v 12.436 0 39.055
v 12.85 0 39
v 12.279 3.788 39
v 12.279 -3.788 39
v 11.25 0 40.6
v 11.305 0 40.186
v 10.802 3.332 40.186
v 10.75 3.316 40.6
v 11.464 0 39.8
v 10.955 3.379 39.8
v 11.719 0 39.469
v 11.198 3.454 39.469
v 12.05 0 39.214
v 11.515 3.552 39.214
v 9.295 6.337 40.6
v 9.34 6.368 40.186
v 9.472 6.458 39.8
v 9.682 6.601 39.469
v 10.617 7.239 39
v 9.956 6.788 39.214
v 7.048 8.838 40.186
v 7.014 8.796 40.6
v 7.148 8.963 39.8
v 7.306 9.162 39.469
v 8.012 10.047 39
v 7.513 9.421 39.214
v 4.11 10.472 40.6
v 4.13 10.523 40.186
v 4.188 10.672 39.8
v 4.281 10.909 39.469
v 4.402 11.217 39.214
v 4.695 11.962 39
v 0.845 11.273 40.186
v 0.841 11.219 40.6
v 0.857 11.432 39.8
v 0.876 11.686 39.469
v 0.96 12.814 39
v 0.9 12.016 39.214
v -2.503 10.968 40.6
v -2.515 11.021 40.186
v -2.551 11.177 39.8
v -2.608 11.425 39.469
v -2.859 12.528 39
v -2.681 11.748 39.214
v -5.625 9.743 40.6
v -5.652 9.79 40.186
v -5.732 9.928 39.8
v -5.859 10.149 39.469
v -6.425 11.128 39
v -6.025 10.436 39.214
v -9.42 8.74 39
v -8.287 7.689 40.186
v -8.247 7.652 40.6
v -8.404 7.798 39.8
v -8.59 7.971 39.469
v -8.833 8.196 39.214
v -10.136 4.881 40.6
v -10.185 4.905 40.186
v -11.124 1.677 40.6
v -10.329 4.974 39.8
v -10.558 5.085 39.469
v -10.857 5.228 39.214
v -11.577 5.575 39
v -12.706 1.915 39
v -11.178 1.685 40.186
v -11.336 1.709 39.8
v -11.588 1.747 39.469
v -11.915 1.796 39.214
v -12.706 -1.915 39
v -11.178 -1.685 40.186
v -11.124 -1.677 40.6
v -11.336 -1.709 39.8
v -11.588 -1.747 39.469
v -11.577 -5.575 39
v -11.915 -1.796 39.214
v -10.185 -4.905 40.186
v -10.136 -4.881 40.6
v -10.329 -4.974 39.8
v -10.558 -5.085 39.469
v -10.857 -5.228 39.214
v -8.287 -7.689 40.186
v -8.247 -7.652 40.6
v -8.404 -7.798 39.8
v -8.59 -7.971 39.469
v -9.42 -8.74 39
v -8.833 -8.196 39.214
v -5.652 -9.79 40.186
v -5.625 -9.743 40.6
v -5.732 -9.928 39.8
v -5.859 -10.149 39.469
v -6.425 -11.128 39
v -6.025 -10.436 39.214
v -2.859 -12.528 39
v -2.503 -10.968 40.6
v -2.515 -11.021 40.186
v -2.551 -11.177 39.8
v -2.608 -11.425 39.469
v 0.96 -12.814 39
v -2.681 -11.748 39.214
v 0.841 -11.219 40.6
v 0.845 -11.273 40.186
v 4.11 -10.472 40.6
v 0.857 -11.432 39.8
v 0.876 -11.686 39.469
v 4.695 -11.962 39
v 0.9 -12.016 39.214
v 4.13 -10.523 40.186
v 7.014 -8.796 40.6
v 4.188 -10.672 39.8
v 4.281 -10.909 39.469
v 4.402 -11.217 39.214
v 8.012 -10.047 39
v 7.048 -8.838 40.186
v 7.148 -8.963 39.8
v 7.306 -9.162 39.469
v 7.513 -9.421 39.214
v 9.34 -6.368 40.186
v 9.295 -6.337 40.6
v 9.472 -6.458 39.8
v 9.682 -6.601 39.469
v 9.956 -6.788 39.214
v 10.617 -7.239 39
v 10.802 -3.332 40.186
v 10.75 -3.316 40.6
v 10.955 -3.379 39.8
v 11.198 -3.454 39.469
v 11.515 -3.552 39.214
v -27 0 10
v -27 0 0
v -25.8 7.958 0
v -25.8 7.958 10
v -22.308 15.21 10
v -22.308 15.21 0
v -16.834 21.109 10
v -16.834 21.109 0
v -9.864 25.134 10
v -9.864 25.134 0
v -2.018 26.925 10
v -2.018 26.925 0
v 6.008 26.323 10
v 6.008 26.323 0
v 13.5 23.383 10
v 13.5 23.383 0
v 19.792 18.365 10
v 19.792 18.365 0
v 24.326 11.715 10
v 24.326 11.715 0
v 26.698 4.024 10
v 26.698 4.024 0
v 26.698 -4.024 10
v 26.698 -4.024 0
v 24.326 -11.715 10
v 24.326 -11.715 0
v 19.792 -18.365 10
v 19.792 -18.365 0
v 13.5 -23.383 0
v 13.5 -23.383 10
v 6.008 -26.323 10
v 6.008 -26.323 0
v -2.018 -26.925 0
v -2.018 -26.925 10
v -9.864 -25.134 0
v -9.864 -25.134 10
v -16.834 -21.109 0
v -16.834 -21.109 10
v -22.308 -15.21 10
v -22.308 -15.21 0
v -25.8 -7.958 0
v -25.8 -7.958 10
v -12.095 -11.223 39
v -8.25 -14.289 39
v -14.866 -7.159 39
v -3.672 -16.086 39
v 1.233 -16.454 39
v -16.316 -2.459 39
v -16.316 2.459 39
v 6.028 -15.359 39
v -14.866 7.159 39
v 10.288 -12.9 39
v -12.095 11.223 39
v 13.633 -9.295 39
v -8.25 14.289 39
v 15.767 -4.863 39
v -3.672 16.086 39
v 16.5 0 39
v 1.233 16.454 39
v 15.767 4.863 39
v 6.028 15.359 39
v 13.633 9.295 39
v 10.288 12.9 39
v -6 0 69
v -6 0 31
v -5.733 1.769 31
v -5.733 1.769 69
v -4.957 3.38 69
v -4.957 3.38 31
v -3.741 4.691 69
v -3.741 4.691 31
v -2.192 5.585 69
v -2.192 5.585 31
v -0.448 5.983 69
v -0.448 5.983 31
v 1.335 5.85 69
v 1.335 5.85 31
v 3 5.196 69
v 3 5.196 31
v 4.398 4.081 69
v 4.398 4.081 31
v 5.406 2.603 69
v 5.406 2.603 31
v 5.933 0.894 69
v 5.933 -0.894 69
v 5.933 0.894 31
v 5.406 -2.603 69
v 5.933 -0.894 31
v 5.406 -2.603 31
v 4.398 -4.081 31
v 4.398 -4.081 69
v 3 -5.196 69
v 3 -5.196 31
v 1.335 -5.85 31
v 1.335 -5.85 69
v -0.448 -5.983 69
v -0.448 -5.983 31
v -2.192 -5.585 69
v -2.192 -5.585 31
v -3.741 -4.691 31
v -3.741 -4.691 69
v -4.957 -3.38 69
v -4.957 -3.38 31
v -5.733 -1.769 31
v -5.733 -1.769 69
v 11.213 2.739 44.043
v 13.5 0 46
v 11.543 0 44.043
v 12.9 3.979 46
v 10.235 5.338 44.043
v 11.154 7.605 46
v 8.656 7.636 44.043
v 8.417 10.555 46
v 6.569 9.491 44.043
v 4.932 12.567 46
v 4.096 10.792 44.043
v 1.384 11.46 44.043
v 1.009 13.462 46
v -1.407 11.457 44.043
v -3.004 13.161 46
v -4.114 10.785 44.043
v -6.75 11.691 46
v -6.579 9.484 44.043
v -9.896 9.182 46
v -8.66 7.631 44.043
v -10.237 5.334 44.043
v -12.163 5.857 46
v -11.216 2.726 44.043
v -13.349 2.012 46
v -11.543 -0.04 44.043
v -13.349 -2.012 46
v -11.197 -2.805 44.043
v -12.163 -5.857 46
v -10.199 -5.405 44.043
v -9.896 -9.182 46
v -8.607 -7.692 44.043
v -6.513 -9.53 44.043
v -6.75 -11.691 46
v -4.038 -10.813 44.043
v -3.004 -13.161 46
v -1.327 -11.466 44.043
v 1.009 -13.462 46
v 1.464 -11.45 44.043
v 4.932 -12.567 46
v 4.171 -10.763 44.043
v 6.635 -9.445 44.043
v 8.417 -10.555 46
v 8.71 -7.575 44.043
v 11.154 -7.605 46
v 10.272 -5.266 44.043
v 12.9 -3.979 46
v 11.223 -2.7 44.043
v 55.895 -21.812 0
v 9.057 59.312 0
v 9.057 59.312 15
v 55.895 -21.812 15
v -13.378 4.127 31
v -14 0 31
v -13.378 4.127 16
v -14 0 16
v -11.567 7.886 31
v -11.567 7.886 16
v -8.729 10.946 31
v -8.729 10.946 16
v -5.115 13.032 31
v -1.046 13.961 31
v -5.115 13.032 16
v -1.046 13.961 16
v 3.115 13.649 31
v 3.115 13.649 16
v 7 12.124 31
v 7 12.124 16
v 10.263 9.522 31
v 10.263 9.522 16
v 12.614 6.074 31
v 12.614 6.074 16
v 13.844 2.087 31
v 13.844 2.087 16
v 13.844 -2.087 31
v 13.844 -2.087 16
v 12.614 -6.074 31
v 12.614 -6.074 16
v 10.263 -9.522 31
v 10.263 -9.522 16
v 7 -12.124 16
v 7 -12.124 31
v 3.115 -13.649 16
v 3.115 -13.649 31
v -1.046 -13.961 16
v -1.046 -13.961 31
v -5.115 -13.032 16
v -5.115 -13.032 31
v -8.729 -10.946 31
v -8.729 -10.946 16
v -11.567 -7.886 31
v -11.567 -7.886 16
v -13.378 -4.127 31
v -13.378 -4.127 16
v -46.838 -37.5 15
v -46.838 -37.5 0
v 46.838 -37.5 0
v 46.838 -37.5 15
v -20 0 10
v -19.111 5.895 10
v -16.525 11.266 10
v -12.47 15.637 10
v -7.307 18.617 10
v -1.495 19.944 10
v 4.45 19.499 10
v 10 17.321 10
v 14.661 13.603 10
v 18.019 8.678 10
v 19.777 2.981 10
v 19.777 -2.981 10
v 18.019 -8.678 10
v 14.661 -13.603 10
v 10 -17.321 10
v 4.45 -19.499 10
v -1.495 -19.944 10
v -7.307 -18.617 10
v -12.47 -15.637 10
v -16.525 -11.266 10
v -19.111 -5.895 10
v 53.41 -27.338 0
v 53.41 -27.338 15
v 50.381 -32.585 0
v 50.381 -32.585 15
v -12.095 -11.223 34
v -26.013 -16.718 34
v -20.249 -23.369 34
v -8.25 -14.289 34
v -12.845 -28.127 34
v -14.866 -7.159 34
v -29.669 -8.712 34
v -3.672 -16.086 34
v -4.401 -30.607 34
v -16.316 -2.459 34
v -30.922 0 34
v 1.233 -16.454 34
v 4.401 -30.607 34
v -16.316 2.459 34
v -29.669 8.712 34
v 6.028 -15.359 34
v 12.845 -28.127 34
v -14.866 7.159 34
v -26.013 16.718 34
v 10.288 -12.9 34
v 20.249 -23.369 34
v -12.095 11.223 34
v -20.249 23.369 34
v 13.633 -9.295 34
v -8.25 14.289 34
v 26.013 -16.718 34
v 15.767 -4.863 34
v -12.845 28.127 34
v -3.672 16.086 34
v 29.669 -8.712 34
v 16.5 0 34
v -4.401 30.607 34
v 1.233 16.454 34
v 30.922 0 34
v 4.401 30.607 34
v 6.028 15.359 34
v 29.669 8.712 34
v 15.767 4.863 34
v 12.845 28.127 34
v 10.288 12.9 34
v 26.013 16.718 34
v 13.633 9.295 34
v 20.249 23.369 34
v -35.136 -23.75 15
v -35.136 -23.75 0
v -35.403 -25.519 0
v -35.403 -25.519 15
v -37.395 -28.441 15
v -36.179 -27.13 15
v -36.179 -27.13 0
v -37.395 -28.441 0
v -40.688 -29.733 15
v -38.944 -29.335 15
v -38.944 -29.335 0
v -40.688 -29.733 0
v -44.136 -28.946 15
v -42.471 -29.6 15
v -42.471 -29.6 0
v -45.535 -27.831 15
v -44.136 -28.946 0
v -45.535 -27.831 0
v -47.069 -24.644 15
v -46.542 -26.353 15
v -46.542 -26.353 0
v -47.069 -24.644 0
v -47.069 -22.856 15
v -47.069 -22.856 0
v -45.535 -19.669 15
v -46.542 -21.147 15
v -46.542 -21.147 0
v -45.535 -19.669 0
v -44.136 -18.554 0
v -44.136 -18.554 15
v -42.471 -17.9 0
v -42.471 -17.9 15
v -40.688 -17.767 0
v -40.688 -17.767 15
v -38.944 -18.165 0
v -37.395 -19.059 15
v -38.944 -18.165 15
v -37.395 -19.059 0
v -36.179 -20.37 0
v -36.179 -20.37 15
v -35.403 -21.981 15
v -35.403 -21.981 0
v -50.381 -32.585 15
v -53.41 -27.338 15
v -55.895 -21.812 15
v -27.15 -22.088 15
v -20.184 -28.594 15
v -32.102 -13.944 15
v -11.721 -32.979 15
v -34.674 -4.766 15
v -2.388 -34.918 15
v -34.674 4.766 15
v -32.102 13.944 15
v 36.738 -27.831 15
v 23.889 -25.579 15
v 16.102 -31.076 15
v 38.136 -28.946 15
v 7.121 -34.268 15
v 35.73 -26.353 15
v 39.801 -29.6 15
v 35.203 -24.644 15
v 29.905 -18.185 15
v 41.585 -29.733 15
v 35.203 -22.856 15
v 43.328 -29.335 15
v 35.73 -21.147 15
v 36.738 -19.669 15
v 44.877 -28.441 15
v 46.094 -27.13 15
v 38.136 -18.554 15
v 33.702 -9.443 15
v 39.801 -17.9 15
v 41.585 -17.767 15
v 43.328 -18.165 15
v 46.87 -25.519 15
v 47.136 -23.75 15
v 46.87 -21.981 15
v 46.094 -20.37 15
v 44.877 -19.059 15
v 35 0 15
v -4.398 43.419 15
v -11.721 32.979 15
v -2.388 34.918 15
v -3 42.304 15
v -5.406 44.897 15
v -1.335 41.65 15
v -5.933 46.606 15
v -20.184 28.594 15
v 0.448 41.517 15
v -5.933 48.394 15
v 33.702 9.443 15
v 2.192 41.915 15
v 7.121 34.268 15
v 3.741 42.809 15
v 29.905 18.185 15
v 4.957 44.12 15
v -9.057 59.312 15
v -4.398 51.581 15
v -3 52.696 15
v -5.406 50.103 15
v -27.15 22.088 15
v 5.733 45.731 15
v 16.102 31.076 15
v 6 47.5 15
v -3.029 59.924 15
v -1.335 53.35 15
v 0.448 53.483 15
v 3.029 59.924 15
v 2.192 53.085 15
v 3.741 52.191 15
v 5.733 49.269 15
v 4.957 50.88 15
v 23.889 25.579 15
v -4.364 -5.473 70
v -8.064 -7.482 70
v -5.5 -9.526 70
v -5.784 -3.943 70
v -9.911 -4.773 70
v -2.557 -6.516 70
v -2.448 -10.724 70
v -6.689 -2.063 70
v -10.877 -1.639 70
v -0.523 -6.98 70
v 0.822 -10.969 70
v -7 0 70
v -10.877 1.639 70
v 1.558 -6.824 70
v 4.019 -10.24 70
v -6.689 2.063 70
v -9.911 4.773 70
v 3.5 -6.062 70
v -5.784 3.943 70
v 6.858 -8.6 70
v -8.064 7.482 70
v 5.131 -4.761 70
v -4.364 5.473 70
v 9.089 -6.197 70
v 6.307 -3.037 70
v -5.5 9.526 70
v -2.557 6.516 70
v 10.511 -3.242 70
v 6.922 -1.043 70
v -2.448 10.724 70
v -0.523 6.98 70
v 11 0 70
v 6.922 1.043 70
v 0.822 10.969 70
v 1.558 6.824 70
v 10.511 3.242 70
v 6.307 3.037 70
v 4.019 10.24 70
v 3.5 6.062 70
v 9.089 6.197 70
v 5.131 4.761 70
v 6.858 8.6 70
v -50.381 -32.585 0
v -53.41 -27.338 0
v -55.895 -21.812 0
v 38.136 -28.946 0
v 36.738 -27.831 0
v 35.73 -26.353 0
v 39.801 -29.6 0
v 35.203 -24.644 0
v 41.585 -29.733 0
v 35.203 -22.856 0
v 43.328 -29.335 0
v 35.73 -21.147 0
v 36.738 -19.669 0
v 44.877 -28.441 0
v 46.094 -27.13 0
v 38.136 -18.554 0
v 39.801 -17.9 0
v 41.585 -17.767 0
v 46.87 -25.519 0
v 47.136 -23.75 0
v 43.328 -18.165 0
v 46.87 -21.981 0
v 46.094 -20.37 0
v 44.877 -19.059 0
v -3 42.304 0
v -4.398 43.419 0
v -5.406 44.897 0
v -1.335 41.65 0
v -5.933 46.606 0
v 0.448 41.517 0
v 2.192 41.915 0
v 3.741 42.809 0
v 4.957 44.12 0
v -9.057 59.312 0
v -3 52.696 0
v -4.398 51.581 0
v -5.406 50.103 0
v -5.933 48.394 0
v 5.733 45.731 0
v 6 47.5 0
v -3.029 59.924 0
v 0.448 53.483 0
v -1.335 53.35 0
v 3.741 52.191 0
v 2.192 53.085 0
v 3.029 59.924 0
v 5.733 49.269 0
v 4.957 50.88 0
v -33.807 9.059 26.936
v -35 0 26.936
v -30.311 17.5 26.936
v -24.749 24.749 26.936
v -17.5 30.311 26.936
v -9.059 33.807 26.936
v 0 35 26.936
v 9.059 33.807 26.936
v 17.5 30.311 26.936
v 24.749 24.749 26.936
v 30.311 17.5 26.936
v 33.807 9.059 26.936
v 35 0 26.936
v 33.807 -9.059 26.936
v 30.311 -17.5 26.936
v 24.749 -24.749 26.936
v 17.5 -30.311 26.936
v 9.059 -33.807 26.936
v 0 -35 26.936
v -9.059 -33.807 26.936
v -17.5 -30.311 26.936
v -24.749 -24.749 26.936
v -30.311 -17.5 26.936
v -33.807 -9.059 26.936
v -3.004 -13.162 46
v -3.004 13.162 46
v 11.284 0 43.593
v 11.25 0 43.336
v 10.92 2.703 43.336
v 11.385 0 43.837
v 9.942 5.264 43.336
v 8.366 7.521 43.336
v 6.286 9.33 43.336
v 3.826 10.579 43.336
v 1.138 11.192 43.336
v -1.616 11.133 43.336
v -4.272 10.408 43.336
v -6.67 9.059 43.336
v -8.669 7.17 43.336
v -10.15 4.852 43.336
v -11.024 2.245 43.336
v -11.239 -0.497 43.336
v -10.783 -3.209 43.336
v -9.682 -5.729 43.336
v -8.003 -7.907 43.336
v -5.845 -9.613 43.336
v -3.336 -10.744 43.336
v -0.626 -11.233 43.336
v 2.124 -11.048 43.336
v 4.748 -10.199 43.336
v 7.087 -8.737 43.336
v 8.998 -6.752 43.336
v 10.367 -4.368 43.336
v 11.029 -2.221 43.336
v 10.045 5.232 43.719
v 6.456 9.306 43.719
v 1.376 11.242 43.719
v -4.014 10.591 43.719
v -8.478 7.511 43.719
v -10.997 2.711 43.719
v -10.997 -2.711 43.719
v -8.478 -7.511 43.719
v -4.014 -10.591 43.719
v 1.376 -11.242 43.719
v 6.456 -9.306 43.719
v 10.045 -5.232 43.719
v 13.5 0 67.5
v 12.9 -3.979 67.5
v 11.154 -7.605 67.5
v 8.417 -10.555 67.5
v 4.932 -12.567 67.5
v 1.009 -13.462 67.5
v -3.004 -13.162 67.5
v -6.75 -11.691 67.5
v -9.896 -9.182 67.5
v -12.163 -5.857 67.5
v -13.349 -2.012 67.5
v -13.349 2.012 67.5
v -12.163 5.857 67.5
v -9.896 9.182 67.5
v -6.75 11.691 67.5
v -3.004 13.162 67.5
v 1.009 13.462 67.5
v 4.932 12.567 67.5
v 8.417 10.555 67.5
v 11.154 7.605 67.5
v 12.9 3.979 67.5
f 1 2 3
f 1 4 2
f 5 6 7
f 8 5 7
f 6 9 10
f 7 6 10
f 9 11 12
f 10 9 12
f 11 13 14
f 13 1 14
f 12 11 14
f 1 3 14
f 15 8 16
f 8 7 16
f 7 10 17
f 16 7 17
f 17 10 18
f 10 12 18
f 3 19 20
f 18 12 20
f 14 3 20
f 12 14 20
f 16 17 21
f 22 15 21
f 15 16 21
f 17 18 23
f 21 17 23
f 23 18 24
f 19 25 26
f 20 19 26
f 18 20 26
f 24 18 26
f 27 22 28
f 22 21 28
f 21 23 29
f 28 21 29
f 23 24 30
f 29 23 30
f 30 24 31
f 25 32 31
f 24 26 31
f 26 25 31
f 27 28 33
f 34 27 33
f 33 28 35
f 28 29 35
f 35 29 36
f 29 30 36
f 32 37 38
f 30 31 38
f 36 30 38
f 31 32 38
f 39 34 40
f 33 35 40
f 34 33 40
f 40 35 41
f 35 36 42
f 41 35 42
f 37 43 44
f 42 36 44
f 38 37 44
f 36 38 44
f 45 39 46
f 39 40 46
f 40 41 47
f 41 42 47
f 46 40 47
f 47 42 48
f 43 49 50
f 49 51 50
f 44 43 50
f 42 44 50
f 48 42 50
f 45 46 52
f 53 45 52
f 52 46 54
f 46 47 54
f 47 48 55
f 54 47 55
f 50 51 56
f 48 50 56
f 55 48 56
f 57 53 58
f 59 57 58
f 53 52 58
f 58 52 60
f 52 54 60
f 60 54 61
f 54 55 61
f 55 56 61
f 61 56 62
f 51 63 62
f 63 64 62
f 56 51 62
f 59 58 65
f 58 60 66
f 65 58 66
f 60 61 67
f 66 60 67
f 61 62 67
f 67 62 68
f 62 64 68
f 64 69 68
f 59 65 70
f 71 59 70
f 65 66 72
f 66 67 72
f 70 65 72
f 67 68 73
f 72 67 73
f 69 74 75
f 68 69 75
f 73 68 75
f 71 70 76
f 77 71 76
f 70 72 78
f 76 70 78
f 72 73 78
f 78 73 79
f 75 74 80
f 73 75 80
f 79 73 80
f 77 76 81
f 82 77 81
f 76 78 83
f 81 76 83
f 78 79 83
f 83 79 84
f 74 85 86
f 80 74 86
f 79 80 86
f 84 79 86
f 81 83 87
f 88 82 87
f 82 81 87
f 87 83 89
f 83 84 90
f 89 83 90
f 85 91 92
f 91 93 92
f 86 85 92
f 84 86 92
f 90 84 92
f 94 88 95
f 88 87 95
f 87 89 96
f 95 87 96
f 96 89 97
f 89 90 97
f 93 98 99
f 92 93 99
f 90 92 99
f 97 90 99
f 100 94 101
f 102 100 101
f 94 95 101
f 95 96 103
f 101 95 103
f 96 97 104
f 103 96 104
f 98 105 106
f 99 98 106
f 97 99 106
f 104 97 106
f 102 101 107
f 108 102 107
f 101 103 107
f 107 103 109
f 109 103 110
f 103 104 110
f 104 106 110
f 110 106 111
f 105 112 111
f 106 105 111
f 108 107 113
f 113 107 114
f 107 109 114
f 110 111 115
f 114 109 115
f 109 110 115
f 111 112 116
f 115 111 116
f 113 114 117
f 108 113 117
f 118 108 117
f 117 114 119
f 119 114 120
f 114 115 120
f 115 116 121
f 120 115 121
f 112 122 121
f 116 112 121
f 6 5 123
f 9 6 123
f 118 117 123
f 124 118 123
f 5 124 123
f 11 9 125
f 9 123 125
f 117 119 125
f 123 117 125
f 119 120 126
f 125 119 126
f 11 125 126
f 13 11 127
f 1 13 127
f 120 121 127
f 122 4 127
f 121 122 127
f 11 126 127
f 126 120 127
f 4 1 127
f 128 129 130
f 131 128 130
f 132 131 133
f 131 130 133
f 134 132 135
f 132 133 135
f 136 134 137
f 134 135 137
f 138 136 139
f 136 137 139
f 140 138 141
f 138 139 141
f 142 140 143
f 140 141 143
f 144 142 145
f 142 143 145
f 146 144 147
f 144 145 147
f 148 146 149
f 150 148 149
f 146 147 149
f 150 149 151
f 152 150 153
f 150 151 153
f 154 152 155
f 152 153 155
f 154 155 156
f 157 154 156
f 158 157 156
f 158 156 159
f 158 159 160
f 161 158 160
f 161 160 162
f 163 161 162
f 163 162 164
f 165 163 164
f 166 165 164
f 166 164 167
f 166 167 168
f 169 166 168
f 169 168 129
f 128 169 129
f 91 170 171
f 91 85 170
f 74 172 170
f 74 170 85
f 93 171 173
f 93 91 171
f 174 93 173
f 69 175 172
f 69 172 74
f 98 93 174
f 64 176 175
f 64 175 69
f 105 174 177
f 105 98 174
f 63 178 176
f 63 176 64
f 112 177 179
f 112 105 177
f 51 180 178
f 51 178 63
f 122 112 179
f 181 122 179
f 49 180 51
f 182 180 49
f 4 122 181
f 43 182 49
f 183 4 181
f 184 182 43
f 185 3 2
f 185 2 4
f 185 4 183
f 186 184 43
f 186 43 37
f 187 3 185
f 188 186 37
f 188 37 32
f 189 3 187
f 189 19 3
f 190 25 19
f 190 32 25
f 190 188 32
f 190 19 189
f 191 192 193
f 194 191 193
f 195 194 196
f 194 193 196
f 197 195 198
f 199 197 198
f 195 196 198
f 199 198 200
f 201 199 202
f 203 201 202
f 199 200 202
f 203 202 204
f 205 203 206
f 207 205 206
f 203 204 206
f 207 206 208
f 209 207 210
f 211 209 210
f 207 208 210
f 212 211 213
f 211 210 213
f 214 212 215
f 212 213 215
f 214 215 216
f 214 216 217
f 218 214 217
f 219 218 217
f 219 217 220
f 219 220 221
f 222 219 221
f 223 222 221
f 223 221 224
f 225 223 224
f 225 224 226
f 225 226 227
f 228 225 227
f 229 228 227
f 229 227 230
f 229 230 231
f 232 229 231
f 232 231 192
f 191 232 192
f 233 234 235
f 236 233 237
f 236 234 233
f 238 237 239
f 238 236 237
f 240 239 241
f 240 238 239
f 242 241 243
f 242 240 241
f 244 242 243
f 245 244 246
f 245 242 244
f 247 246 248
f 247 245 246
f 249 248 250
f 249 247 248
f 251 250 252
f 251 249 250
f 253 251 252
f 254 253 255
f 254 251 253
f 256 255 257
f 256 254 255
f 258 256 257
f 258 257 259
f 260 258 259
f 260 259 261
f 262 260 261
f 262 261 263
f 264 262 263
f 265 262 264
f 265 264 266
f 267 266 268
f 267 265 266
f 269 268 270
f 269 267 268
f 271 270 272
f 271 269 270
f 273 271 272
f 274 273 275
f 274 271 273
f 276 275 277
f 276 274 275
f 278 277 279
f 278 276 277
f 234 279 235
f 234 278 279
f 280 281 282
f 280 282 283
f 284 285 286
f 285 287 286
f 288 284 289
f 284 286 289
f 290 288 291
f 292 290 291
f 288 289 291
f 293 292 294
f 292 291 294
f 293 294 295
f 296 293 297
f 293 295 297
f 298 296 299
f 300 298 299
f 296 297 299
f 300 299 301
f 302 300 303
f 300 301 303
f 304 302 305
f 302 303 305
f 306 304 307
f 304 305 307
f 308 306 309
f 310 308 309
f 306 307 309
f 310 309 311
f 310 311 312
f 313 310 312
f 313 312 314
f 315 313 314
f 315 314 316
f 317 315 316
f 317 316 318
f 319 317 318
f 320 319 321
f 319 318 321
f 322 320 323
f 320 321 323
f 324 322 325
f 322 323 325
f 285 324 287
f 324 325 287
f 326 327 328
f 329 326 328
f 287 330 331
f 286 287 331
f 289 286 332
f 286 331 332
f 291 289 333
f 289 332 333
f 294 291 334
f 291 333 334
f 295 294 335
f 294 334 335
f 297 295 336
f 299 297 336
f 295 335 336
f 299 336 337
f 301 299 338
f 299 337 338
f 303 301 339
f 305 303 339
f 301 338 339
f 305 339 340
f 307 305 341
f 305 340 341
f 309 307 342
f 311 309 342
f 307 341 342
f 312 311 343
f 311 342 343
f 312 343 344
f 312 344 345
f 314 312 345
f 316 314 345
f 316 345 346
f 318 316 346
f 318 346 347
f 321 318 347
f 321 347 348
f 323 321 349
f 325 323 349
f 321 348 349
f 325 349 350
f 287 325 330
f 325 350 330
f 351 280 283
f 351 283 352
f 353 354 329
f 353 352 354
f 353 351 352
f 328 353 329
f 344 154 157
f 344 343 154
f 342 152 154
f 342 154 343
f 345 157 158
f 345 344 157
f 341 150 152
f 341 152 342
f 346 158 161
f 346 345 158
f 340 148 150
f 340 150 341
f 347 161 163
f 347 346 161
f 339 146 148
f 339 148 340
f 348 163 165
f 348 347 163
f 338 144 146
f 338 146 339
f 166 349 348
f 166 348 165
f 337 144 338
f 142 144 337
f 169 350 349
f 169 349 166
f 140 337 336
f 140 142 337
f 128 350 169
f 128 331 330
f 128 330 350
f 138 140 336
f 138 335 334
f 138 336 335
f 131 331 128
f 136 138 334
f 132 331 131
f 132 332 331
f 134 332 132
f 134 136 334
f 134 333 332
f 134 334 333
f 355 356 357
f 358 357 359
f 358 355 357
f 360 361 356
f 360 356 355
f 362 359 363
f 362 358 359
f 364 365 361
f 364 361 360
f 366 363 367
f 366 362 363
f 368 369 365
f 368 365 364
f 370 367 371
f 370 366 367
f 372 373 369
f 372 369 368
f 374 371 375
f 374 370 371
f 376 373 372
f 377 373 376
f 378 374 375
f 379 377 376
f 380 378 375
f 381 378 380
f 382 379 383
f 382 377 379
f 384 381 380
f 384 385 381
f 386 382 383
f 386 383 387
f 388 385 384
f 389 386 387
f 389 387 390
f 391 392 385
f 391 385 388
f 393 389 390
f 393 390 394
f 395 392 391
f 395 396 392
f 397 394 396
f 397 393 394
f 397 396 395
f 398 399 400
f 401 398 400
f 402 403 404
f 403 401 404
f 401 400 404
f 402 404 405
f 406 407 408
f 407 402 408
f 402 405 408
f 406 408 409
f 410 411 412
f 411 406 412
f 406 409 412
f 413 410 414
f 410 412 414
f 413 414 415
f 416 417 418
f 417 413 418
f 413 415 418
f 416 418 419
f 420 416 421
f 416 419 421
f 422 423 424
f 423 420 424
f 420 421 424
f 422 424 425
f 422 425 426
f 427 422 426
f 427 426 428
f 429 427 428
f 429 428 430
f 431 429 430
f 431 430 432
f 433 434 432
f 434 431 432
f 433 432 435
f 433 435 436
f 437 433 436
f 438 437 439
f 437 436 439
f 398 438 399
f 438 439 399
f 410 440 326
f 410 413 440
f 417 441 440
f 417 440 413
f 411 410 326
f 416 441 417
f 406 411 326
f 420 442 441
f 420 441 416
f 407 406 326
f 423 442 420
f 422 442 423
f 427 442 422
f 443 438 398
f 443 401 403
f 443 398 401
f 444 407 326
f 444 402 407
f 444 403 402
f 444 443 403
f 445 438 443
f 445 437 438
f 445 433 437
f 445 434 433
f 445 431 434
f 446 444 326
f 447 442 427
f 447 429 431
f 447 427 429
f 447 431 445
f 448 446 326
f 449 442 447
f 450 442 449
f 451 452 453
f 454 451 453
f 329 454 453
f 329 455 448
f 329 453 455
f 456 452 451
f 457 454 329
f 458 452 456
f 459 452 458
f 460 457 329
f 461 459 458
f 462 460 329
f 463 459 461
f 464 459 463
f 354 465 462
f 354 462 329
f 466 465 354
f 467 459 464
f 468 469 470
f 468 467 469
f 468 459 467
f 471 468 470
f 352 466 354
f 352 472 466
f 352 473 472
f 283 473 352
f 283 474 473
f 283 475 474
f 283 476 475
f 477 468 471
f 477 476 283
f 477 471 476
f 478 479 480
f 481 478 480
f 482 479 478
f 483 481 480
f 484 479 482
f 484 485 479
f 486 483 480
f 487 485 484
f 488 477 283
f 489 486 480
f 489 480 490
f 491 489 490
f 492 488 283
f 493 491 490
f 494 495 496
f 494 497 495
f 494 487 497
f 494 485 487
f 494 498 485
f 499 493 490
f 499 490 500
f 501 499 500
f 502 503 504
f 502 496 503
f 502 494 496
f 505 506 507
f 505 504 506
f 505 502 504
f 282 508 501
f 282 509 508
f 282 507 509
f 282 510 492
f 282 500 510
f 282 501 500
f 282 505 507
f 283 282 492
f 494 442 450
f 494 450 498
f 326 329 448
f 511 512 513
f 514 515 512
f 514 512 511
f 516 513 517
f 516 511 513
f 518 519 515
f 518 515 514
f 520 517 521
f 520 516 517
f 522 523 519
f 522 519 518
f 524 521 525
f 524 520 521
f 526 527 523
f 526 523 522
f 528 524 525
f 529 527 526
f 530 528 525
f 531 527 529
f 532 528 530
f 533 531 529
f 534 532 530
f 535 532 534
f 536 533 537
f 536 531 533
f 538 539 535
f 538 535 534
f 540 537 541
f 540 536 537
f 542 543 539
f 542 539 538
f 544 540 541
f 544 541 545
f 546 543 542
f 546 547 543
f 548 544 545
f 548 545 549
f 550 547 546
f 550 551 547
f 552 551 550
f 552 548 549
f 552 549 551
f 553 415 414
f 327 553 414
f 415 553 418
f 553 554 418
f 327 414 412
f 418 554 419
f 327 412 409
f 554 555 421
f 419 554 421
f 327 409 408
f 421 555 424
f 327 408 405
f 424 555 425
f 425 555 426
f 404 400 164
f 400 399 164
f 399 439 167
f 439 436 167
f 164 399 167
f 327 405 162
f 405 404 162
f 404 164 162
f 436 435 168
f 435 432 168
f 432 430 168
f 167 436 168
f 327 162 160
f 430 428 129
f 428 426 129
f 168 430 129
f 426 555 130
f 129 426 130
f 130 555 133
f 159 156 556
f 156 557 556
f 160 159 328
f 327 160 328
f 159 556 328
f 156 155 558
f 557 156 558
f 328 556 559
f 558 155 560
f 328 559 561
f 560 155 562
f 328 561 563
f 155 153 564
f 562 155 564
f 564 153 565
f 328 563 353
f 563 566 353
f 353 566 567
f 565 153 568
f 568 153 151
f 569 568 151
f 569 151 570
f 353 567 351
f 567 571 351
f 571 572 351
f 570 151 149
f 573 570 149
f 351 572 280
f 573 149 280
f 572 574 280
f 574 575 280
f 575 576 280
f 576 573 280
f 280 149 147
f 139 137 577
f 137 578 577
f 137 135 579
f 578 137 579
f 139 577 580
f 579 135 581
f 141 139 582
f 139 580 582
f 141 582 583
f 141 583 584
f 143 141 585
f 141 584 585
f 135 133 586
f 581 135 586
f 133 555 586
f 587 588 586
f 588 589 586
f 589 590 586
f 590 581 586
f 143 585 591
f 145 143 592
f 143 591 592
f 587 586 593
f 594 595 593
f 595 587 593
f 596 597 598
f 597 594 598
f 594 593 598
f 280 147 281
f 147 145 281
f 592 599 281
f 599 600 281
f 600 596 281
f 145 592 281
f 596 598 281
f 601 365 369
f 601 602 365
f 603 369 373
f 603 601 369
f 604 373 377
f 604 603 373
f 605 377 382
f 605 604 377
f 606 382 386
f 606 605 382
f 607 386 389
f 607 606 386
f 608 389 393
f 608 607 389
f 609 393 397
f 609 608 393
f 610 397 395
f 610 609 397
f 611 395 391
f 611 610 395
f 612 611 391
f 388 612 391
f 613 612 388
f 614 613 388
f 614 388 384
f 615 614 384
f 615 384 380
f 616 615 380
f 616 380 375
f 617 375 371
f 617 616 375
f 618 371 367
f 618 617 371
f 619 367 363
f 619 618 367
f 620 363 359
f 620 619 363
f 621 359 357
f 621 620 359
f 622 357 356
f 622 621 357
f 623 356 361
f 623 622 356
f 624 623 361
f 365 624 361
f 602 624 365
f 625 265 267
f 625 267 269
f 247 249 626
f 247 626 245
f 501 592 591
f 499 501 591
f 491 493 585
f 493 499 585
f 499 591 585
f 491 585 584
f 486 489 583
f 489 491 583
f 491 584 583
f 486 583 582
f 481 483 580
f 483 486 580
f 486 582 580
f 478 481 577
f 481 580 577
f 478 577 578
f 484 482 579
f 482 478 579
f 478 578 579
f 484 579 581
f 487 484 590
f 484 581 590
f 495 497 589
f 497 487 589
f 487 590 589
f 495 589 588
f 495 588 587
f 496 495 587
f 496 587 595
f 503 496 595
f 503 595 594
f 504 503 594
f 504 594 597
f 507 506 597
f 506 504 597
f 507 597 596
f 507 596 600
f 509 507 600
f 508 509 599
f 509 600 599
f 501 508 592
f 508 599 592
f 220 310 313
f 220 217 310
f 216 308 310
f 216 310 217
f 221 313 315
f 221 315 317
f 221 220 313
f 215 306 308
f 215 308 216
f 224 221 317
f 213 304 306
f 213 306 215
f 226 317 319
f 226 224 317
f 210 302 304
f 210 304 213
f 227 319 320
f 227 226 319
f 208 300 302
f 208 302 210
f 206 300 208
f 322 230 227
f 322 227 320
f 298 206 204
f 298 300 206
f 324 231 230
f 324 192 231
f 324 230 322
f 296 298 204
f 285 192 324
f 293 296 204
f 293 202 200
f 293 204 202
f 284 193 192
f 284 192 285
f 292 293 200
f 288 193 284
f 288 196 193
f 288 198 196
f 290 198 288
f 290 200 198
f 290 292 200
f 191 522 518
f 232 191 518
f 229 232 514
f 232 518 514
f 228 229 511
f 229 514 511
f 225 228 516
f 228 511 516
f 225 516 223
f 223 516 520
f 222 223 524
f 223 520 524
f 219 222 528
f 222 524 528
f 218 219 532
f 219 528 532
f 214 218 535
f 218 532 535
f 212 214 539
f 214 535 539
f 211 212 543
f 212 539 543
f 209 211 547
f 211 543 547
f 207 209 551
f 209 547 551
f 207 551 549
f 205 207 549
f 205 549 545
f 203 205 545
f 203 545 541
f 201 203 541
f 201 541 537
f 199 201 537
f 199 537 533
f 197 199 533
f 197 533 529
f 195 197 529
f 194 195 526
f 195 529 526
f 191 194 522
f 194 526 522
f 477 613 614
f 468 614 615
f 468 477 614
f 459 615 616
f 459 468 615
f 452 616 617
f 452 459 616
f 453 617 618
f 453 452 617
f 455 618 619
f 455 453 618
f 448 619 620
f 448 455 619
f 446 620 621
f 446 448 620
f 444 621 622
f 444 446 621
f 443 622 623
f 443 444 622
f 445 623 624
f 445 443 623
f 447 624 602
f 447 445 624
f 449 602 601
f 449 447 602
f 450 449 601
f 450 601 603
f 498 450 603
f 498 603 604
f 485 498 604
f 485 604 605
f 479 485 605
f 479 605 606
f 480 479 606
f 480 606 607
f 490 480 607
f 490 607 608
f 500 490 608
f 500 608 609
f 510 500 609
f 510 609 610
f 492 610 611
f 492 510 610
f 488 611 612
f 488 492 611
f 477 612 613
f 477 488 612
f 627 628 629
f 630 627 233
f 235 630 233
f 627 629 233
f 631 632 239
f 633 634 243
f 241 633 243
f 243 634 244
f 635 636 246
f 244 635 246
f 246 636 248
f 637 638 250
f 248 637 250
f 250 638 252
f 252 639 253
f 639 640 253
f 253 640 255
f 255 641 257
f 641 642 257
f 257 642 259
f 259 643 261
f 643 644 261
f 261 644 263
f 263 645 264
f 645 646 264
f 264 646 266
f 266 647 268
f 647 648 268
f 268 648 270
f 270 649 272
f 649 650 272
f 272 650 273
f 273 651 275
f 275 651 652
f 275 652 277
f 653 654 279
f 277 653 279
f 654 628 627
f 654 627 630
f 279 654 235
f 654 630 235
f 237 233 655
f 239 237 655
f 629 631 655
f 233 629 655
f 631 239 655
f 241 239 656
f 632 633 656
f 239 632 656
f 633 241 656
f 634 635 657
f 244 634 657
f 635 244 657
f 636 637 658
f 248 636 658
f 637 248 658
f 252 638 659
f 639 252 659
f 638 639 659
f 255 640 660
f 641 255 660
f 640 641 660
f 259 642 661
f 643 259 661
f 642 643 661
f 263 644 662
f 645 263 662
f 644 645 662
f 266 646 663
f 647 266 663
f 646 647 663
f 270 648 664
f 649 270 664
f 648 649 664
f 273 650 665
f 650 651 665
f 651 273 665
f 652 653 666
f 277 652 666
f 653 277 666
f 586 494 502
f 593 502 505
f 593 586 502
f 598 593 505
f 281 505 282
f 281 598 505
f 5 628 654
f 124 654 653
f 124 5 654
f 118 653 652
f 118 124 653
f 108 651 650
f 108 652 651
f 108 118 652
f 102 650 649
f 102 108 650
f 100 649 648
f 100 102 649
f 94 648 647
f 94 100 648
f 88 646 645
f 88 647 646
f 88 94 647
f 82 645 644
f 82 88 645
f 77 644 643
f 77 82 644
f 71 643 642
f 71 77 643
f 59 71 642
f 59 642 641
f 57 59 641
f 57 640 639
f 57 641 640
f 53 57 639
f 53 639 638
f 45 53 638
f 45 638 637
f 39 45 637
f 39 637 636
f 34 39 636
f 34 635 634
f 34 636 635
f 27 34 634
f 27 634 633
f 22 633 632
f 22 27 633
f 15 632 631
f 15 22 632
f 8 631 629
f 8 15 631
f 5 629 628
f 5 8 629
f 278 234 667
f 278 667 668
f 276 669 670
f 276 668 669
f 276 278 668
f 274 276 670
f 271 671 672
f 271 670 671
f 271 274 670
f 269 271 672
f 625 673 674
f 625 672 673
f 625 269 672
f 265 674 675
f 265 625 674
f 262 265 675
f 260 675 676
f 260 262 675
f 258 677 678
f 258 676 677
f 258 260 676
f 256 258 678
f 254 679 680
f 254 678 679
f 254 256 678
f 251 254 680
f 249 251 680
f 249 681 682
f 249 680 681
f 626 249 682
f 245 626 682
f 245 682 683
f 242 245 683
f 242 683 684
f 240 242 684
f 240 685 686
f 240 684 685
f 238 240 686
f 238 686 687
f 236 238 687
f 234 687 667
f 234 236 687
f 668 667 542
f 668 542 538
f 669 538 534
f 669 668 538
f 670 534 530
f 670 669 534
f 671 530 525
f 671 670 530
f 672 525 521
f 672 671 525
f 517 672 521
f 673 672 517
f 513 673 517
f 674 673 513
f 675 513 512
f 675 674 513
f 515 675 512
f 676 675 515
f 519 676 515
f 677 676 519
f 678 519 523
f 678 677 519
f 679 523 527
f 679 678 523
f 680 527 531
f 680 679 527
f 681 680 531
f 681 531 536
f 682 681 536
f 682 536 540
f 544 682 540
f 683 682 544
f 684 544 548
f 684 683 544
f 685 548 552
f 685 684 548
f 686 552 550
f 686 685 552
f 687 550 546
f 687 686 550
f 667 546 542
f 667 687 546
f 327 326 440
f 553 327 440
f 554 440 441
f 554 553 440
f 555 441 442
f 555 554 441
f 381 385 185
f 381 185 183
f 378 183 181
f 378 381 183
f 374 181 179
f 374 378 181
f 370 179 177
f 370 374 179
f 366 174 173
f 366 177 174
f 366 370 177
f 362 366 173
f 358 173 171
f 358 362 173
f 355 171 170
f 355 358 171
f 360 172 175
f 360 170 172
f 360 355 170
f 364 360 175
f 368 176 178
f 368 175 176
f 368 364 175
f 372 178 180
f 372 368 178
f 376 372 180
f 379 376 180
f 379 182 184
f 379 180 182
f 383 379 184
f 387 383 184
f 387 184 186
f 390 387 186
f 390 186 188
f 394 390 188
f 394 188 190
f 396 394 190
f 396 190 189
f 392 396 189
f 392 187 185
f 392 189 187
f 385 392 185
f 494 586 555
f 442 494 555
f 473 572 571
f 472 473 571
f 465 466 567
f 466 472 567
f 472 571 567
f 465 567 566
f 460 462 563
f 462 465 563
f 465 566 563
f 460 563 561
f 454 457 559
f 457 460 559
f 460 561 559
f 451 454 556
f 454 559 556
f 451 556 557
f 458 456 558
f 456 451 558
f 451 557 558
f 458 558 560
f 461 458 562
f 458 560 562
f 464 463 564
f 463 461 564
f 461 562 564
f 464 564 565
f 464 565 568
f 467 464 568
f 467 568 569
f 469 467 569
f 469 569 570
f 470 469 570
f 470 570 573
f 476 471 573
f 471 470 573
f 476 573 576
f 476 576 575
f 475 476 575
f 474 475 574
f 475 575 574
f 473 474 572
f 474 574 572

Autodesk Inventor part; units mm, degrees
ref_plane "YZ Plane" through (0, 0, 0) normal (1, 0, 0) x (0, 1, 0)
ref_plane "XZ Plane" through (0, 0, 0) normal (0, 1, 0) x (-1, 0, 0)
ref_plane "XY Plane" through (0, 0, 0) normal (0, 0, 1) x (1, 0, 0)
sketch "Эскиз1" plane through (0, 0, 0) normal (0, 0, 1) x (1, 0, 0)
  line L0 (-9.0572, 59.3125) -> (-55.8947, -21.8125)
  line L1 (-46.8375, -37.5) -> (46.8375, -37.5)
  line L2 (9.0572, 59.3125) -> (55.8947, -21.8125)
  arc A0 (9.0572, 59.3125) -> (-9.0572, 59.3125) centre (0, 0) ccw
  arc A1 (-55.8947, -21.8125) -> (-46.8375, -37.5) centre (0, 0) ccw
  arc A2 (46.8375, -37.5) -> (55.8947, -21.8125) centre (0, 0) ccw
  circle A3 centre (0, 47.5) radius 6
  circle A4 centre (41.1362, -23.75) radius 6
  circle A5 centre (-41.1362, -23.75) radius 6
  point P0 (51.9615, -30)
  dimension "d3" = 12
  dimension "d4" = 12
  dimension "d5" = 12
  dimension "d7" = 47.5
  dimension "d8" = 41.1362
  dimension "d9" = 41.1362
  dimension "d10" = 13.75
  dimension "d11" = 13.75
  dimension "d12" = 13.75
extrude "Выдавливание1" add sketch "Эскиз1" along normal blind 15
sketch "Эскиз2" plane through (0, 0, 15) normal (0, 0, 1) x (1, 0, 0)
  circle A0 centre (0, 0) radius 35
  dimension "d15" = 70
extrude "Выдавливание2" add sketch "Эскиз2" along normal blind 19
sketch "Эскиз4" plane through (0, 0, 0) normal (0, 1, 0) x (-1, 0, 0)
  line L0 (35, 34) -> (-35, 34) projected
  line L1 (30.9218, 34) -> (35, 26.9363)
  line L2 (35, 15) -> (35, 34) projected
  line L3 (30.9218, 34) -> (35, 34)
  line L4 (0, -6.8) -> (0, 40.8) projected
  point P0 (0, 0)
  dimension "d21" = 30
revolve "Вращение1" cut sketch "Эскиз4" angle 360 about axis through (0, 0, -10) along (0, 0, 1)
sketch "Эскиз5" plane through (0, 0, 34) normal (0, 0, 1) x (1, 0, 0)
  circle A0 centre (0, 0) radius 16.5
  dimension "d23" = 33
extrude "Выдавливание3" add sketch "Эскиз5" along normal blind 5
sketch "Эскиз6" plane through (0, 0, 39) normal (0, 0, 1) x (1, 0, 0)
  circle A0 centre (0, 0) radius 11.25
  dimension "d26" = 22.5
extrude "Выдавливание4" add sketch "Эскиз6" along normal blind 7
sketch "Эскиз7" plane through (0, 0, 46) normal (0, 0, 1) x (1, 0, 0)
  circle A0 centre (0, 0) radius 13.5
  dimension "d29" = 27
extrude "Выдавливание5" add sketch "Эскиз7" along normal blind 24
sketch "Эскиз8" plane through (0, 0, 0) normal (0, 0, -1) x (-1, 0, 0)
  circle A0 centre (0, 0) radius 27
  dimension "d32" = 54
extrude "Выдавливание6" cut sketch "Эскиз8" against normal blind 10
sketch "Эскиз15" plane through (0, 0, 10) normal (0, 0, -1) x (-1, 0, 0)
  circle A0 centre (0, 0) radius 14
  dimension "d54" = 28
extrude "Выдавливание11" cut sketch "Эскиз15" against normal blind 21
chamfer "Фаска1" distance 6 angle 45 1 edges at (14, 0, 10)
sketch "Эскиз16" plane through (0, 0, 31) normal (0, 0, -1) x (-1, 0, 0)
  circle A0 centre (0, 0) radius 6
  dimension "d60" = 12
extrude "Выдавливание12" cut sketch "Эскиз16" against normal blind 39
thread "Резьба1" size "M27x3" class "6g" standard "ANSI Metric M Profile" full length
fillet "Сопряжение1" radius 1.6 1 edges at (-11.25, 0, 39)
chamfer "Фаска2" distance 2.25 angle 45 1 edges at (-11.25, 0, 46)
fillet "Сопряжение2" radius 1 1 edges at (-11.25, 0, 43.7501)
chamfer "Фаска3" distance 2.5 angle 45 1 edges at (-13.5, 0, 70)
chamfer "Фаска4" distance 1 angle 45 1 edges at (6, 0, 70)
